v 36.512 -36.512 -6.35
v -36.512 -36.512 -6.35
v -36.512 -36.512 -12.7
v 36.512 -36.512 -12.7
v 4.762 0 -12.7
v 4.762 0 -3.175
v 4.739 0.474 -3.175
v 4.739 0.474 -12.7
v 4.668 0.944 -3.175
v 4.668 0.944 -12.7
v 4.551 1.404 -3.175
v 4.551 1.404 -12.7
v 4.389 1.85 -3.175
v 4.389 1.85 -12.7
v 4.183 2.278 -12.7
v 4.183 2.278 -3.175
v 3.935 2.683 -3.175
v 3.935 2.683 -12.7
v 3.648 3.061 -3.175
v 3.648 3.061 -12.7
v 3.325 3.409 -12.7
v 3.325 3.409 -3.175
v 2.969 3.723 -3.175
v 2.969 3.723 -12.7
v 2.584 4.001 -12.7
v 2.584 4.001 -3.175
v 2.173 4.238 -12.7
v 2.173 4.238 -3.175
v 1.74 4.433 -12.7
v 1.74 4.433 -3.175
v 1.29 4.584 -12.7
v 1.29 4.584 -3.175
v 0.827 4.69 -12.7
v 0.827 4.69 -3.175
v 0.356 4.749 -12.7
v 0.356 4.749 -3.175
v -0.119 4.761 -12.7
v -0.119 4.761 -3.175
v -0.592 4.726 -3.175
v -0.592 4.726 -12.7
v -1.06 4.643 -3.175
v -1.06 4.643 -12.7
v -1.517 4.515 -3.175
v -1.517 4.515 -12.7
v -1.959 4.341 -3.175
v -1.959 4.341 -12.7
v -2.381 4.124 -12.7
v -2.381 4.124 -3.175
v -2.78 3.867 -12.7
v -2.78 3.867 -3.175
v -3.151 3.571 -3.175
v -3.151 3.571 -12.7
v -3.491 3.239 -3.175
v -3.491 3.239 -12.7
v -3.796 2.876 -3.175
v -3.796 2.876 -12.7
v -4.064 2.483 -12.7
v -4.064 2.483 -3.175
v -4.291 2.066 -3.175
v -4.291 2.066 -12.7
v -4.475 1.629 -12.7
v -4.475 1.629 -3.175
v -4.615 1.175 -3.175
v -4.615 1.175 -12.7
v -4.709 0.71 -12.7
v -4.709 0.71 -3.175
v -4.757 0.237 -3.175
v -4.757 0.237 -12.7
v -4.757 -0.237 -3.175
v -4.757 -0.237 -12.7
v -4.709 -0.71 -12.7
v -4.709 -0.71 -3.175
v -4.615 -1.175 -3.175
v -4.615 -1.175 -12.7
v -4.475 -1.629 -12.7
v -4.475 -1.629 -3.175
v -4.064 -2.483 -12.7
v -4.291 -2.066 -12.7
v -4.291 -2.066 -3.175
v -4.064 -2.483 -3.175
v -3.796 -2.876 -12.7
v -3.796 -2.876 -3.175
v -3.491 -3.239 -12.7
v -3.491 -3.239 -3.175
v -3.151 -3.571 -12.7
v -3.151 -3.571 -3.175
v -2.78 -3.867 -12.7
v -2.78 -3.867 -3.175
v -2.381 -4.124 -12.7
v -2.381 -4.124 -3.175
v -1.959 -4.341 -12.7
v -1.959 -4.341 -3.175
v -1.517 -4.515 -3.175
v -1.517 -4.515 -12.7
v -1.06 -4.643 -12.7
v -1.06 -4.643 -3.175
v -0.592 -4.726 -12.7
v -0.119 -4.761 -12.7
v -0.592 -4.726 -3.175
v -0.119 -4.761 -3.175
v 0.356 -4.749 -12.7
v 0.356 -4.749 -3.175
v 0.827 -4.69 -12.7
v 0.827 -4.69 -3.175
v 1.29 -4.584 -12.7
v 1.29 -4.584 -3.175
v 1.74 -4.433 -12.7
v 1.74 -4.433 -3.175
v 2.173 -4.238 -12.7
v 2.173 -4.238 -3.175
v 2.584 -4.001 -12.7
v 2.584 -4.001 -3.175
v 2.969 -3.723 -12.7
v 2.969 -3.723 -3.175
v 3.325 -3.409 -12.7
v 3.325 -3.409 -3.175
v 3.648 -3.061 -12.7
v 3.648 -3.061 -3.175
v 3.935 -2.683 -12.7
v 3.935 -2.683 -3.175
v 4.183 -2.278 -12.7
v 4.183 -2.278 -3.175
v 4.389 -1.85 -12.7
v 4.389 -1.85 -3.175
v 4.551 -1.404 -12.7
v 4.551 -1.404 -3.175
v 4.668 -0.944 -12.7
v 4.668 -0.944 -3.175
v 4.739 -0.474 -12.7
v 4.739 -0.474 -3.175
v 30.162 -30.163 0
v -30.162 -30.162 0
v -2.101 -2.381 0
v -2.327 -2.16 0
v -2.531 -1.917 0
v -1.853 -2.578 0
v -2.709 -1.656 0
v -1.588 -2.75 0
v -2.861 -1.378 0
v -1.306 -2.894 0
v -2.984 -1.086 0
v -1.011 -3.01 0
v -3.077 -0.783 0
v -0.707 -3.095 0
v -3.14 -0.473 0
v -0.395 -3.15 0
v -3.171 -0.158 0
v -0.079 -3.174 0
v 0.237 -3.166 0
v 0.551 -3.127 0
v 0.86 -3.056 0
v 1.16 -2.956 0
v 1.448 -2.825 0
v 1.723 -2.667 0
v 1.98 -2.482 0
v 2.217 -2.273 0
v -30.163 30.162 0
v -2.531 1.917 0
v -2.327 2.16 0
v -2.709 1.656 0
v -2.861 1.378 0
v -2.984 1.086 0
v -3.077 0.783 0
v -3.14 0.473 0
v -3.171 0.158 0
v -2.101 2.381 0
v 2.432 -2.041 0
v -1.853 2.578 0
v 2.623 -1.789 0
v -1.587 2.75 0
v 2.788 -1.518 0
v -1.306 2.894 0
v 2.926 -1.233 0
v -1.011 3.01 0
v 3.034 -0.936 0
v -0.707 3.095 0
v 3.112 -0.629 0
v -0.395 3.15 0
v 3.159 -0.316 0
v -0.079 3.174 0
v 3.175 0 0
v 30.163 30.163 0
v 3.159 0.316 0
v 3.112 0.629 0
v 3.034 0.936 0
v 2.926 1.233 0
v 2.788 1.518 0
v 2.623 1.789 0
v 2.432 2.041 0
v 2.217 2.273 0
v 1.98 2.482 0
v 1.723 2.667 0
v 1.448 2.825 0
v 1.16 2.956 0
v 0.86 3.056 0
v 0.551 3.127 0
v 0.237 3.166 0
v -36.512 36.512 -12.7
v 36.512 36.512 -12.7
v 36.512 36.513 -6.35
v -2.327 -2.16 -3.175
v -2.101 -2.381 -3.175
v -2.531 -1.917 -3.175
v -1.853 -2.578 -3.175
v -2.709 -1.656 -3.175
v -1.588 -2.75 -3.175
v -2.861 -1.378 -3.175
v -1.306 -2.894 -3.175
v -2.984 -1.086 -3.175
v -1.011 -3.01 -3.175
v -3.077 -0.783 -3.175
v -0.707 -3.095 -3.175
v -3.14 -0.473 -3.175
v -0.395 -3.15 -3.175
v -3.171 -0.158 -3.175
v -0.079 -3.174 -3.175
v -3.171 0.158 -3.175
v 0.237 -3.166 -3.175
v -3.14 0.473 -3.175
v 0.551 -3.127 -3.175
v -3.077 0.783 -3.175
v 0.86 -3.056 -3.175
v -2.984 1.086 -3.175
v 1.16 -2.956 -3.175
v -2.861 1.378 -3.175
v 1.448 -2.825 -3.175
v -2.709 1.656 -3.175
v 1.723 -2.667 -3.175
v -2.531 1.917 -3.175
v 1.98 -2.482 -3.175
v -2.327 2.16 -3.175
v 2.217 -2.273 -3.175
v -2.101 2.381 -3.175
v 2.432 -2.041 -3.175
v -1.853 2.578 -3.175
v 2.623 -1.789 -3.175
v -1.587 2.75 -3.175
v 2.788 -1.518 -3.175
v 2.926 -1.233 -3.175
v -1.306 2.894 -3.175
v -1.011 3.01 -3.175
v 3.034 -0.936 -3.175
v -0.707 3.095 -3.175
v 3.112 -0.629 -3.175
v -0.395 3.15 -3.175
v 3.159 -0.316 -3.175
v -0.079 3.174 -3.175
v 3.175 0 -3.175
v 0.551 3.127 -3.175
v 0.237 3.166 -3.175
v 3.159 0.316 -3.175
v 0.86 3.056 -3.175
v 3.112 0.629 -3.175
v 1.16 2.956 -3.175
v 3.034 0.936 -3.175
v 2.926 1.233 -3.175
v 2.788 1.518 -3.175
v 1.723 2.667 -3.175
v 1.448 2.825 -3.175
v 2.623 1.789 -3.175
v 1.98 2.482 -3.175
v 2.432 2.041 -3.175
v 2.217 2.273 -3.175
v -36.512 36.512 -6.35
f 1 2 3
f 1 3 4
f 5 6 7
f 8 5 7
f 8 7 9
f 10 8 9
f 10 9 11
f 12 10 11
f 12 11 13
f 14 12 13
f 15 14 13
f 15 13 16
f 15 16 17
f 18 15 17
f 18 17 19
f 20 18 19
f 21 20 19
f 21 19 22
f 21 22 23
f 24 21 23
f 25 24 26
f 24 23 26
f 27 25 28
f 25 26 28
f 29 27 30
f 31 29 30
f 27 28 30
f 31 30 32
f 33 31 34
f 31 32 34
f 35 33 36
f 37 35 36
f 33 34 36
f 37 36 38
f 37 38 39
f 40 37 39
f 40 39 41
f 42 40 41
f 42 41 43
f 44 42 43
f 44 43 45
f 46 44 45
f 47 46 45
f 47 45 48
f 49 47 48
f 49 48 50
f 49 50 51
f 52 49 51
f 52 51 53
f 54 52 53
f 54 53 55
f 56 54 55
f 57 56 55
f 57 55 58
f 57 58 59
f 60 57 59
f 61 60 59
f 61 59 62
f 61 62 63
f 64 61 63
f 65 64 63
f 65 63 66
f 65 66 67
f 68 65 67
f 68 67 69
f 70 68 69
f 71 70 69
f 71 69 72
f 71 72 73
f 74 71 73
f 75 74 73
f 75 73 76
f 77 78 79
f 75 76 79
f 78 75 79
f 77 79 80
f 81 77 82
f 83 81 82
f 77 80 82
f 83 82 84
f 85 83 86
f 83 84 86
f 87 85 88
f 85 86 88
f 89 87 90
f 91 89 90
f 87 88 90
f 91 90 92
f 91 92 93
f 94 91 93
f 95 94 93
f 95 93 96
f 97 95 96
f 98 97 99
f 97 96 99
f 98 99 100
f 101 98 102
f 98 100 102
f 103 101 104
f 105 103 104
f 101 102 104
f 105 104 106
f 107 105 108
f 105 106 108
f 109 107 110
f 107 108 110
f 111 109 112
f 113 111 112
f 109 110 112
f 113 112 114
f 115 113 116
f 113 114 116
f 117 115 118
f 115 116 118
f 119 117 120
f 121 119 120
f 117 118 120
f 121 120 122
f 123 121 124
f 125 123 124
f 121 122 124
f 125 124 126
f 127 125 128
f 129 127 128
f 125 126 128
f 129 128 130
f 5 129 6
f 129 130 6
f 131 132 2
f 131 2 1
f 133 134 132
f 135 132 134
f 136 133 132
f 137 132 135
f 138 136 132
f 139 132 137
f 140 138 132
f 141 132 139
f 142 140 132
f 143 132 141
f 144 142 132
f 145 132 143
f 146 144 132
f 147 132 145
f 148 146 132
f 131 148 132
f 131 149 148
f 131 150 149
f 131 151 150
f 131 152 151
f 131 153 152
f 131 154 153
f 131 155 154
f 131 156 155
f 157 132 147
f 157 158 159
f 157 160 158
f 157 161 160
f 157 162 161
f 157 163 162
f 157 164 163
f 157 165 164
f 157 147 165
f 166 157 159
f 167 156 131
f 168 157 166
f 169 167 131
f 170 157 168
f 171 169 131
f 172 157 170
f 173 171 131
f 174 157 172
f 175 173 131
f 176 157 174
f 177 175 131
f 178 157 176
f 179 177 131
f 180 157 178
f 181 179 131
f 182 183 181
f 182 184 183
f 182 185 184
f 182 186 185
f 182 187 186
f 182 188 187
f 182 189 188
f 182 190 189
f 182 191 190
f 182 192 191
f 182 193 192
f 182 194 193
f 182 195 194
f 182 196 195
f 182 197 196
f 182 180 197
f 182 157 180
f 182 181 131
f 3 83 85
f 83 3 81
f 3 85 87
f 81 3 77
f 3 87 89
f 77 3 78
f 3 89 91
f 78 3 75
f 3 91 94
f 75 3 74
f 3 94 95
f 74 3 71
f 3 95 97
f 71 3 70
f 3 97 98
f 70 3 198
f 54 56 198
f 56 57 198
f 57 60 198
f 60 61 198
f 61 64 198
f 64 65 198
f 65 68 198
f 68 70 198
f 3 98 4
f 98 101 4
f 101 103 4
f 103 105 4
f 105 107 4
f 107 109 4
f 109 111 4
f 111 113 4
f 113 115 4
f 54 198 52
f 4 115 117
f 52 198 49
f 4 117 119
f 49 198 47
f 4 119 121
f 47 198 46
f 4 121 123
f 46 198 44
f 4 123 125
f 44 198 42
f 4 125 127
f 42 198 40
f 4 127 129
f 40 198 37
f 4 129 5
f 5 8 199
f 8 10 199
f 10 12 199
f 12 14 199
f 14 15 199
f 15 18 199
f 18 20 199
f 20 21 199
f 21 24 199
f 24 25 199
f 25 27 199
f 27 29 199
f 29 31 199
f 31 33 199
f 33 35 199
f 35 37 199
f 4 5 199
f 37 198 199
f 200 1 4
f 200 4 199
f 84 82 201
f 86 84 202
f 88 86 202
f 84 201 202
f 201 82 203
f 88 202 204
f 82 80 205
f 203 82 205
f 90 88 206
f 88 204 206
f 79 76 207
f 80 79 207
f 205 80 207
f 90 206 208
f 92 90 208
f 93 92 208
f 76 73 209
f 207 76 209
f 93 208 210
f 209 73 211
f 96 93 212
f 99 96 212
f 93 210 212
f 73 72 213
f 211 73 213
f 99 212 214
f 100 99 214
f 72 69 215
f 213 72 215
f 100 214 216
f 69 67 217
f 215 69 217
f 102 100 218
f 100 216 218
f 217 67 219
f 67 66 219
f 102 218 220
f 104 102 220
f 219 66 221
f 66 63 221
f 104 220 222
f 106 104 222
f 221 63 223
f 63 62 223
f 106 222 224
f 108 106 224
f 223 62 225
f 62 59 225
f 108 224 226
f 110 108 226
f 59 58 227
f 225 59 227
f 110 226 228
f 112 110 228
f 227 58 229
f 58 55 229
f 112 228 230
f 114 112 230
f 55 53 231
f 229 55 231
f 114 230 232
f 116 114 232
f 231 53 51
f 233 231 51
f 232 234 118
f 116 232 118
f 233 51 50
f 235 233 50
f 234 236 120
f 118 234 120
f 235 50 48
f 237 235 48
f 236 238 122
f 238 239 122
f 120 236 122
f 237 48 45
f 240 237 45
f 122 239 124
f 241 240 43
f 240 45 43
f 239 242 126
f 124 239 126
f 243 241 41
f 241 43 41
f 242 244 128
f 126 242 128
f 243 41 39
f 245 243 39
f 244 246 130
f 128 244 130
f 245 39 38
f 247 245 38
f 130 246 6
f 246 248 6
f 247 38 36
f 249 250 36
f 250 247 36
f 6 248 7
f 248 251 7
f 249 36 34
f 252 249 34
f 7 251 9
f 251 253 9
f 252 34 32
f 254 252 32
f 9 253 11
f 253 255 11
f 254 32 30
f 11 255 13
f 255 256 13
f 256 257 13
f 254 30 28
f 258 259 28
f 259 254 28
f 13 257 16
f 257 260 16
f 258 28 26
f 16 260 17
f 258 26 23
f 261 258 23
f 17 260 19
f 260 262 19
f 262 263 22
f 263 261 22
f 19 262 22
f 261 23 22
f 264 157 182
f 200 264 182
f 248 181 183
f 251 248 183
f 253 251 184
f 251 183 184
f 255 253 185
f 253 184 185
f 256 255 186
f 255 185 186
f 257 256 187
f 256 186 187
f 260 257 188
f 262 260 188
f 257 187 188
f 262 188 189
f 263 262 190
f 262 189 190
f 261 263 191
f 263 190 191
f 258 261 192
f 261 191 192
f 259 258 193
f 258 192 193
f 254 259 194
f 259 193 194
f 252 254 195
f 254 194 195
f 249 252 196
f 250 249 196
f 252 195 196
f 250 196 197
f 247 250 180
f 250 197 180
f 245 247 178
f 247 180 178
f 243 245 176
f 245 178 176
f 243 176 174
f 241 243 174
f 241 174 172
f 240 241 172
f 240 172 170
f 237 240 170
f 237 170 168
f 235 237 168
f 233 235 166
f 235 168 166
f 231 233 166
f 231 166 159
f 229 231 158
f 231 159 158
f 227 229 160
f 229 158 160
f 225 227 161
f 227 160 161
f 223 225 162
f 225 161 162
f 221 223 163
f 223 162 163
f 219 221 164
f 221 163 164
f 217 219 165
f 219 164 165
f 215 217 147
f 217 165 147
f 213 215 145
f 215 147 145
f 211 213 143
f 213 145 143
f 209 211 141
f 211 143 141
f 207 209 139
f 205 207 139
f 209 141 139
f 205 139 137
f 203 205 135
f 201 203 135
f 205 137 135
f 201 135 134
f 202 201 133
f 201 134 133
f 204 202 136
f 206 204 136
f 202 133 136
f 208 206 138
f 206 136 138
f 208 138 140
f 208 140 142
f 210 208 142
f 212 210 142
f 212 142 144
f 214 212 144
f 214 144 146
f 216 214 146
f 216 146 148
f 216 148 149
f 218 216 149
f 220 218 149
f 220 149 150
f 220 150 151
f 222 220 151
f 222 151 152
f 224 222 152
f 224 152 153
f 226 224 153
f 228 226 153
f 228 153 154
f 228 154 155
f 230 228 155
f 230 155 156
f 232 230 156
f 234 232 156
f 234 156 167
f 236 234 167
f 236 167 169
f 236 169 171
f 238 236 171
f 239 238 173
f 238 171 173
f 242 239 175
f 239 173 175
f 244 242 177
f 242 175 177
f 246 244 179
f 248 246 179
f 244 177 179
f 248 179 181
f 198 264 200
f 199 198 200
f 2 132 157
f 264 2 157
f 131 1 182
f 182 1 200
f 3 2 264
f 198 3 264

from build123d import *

# Parameters (mm, degrees)
SKETCH1_W           = 73.025
SKETCH1_H           = 73.025
BOSS_EXTRUDE1_DEPTH = 12.7
SKETCH2_R           = 3.175
CUT_EXTRUDE1_DEPTH  = 3.175
SKETCH3_R           = 4.7625
CUT_EXTRUDE2_DEPTH  = 10.525
CHAMFER1_SIZE       = 6.35


with BuildPart() as part:
    # Sketch1 → Boss-Extrude1 (new body)
    with BuildSketch(Plane.XY):
        Rectangle(SKETCH1_W, SKETCH1_H)
    extrude(amount=-BOSS_EXTRUDE1_DEPTH)

    # Sketch2 → Cut-Extrude1 (cut)
    with BuildSketch(Plane.XY):
        Circle(SKETCH2_R)
    extrude(amount=-CUT_EXTRUDE1_DEPTH, mode=Mode.SUBTRACT)

    # Sketch3 → Cut-Extrude2 (cut, through all)
    with BuildSketch(Plane.XY.offset(-3.175)):
        Circle(SKETCH3_R)
    extrude(amount=-CUT_EXTRUDE2_DEPTH, mode=Mode.SUBTRACT)

    # Chamfer1
    chamfer1_edges = [part.edges().sort_by_distance(p)[0] for p in [
        (0, 36.5125, 0),
        (36.5125, 0, 0),
        (0, -36.5125, 0),
        (-36.5125, 0, 0),
    ]]
    chamfer(chamfer1_edges, length=CHAMFER1_SIZE)


solid = part.part
